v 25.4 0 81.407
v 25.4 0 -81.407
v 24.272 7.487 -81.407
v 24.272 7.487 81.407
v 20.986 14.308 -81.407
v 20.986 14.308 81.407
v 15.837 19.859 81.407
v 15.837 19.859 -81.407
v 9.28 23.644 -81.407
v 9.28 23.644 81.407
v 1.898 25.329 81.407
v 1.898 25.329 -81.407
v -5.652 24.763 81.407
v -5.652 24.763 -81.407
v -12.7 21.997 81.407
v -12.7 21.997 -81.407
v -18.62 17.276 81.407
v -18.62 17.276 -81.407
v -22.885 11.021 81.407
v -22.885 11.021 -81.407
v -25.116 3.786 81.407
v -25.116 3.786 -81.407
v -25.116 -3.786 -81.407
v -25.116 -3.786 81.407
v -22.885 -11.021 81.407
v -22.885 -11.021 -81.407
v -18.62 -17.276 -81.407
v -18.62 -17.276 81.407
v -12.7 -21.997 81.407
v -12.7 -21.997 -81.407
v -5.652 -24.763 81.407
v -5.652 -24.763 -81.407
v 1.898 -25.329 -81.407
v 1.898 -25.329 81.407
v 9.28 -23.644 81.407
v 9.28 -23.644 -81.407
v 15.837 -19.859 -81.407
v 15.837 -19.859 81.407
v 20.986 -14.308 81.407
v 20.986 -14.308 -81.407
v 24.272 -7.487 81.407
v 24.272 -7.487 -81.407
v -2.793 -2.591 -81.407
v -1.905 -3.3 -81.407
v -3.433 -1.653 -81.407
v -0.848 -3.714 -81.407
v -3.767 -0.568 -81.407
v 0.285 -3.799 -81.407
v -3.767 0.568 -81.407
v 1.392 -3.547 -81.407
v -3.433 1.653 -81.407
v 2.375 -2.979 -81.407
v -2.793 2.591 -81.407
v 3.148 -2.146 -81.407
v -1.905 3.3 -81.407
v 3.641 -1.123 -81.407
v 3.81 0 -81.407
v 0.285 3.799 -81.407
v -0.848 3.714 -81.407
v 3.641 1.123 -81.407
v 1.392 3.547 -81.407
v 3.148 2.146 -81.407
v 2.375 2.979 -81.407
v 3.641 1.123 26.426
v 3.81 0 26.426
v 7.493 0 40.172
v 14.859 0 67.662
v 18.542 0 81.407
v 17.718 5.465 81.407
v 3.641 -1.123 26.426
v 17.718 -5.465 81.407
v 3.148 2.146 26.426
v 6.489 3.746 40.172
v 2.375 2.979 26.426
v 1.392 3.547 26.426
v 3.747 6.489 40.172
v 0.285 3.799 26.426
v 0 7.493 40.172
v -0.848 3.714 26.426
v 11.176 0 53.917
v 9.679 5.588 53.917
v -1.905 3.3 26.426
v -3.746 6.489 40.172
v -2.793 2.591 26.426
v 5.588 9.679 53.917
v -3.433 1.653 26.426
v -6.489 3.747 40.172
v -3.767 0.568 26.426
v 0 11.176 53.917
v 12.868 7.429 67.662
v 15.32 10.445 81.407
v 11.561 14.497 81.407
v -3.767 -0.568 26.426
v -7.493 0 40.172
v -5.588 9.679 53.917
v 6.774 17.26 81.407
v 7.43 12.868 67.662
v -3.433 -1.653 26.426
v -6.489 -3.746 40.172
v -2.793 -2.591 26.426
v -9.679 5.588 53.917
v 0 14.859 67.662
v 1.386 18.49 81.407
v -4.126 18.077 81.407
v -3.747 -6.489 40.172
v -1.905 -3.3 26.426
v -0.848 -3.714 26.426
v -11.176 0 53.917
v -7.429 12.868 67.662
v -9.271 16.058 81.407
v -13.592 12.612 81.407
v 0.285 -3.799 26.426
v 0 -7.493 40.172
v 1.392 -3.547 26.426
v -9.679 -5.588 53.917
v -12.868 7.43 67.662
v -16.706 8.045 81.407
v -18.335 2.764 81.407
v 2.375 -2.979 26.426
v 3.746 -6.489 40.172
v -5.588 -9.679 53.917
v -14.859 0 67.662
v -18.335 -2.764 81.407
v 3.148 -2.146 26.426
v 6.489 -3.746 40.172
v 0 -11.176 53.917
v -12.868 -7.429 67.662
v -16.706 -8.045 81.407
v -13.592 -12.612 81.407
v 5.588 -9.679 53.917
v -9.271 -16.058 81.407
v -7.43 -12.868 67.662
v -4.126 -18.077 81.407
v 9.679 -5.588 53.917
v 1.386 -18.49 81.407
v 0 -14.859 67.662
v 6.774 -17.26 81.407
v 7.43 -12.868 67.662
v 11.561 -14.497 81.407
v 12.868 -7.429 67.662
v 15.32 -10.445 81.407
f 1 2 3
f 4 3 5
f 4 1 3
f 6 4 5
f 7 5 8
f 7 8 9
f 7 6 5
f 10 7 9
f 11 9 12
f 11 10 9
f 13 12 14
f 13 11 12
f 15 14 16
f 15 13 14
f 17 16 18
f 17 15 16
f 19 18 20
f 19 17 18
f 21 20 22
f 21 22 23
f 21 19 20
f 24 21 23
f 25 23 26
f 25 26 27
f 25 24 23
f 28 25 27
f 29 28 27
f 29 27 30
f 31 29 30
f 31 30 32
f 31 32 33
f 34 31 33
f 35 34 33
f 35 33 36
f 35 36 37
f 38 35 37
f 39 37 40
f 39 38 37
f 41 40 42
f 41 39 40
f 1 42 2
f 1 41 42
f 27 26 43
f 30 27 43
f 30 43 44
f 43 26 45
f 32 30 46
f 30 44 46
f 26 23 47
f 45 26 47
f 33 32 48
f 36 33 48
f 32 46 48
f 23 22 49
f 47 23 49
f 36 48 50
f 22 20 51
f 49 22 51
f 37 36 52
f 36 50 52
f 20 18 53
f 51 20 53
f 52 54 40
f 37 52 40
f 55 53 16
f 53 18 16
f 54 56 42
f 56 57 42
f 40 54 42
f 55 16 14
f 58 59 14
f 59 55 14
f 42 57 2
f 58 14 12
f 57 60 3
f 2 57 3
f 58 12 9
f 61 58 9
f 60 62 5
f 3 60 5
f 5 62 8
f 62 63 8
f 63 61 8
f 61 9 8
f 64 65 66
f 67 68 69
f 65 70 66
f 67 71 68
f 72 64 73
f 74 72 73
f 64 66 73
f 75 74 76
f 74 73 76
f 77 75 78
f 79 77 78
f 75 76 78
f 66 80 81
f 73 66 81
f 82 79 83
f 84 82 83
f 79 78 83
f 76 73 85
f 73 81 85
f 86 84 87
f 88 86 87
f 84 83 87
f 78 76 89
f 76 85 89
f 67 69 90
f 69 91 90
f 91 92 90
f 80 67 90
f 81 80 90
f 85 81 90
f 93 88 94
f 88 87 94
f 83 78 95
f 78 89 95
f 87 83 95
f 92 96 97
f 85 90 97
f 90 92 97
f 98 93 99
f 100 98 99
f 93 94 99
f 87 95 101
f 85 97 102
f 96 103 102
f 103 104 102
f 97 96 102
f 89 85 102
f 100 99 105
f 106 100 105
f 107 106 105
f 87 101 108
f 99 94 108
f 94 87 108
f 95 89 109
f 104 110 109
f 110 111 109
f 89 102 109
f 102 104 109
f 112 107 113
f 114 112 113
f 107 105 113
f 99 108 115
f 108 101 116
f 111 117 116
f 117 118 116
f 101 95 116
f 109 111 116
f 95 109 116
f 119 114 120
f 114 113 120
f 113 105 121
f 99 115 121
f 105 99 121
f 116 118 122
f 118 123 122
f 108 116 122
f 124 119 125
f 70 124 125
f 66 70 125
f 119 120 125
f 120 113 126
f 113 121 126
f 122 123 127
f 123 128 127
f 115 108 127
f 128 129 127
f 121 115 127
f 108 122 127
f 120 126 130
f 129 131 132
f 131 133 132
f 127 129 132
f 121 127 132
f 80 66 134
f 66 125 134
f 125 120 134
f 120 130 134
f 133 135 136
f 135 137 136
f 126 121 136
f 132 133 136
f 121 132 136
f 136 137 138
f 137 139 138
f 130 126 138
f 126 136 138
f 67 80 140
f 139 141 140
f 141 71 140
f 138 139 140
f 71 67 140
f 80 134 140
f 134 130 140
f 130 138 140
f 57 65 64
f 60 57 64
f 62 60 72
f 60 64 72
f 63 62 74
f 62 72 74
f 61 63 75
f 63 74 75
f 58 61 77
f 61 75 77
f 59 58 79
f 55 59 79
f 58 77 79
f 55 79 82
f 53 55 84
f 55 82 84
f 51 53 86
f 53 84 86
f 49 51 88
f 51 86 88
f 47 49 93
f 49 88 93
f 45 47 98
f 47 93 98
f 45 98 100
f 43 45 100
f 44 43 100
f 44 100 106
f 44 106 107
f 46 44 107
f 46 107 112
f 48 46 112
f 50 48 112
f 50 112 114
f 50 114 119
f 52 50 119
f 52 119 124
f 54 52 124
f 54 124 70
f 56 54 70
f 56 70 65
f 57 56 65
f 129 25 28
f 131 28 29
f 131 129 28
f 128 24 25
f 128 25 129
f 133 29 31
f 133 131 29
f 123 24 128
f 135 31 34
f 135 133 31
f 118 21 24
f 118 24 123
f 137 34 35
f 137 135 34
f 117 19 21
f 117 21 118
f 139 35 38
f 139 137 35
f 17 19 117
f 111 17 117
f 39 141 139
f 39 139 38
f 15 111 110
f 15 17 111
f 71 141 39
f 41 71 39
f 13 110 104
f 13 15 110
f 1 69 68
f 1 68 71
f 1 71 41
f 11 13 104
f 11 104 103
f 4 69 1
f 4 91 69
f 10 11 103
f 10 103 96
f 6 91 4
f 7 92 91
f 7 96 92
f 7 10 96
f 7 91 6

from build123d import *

# Parameters (mm, degrees)
SKETCH1_R           = 25.4
BOSS_EXTRUDE1_DEPTH = 81.407
SKETCH2_R           = 3.81
CUT_EXTRUDE2_DEPTH  = 167.729477286


with BuildPart() as part:
    # Sketch1 → Boss-Extrude1 (new, symmetric)
    with BuildSketch(Plane.XY):
        Circle(SKETCH1_R)
    extrude(amount=BOSS_EXTRUDE1_DEPTH, both=True)

    # Sketch2 → Cut-Extrude2 (cut, through all)
    with BuildSketch(Plane.XY.offset(81.407)):
        Circle(SKETCH2_R)
    extrude(amount=-CUT_EXTRUDE2_DEPTH, mode=Mode.SUBTRACT)

    # Sketch6 → Cut-Revolve1 (revolve, cut)
    with BuildSketch(Plane(origin=(0, 0, 0), x_dir=(0, 0, -1), z_dir=(1, 0, 0)), mode=Mode.PRIVATE) as cut_revolve1_sk:
        Polygon((-12.207313926, 0), (-81.407, 18.542), (-81.407, 0), align=None)
    revolve(cut_revolve1_sk.sketch.rotate(Axis((0, 0, -89.5477), (0, 0, 1)), 270), axis=Axis((0, 0, -89.5477), (0, 0, 1)), mode=Mode.SUBTRACT)


solid = part.part
